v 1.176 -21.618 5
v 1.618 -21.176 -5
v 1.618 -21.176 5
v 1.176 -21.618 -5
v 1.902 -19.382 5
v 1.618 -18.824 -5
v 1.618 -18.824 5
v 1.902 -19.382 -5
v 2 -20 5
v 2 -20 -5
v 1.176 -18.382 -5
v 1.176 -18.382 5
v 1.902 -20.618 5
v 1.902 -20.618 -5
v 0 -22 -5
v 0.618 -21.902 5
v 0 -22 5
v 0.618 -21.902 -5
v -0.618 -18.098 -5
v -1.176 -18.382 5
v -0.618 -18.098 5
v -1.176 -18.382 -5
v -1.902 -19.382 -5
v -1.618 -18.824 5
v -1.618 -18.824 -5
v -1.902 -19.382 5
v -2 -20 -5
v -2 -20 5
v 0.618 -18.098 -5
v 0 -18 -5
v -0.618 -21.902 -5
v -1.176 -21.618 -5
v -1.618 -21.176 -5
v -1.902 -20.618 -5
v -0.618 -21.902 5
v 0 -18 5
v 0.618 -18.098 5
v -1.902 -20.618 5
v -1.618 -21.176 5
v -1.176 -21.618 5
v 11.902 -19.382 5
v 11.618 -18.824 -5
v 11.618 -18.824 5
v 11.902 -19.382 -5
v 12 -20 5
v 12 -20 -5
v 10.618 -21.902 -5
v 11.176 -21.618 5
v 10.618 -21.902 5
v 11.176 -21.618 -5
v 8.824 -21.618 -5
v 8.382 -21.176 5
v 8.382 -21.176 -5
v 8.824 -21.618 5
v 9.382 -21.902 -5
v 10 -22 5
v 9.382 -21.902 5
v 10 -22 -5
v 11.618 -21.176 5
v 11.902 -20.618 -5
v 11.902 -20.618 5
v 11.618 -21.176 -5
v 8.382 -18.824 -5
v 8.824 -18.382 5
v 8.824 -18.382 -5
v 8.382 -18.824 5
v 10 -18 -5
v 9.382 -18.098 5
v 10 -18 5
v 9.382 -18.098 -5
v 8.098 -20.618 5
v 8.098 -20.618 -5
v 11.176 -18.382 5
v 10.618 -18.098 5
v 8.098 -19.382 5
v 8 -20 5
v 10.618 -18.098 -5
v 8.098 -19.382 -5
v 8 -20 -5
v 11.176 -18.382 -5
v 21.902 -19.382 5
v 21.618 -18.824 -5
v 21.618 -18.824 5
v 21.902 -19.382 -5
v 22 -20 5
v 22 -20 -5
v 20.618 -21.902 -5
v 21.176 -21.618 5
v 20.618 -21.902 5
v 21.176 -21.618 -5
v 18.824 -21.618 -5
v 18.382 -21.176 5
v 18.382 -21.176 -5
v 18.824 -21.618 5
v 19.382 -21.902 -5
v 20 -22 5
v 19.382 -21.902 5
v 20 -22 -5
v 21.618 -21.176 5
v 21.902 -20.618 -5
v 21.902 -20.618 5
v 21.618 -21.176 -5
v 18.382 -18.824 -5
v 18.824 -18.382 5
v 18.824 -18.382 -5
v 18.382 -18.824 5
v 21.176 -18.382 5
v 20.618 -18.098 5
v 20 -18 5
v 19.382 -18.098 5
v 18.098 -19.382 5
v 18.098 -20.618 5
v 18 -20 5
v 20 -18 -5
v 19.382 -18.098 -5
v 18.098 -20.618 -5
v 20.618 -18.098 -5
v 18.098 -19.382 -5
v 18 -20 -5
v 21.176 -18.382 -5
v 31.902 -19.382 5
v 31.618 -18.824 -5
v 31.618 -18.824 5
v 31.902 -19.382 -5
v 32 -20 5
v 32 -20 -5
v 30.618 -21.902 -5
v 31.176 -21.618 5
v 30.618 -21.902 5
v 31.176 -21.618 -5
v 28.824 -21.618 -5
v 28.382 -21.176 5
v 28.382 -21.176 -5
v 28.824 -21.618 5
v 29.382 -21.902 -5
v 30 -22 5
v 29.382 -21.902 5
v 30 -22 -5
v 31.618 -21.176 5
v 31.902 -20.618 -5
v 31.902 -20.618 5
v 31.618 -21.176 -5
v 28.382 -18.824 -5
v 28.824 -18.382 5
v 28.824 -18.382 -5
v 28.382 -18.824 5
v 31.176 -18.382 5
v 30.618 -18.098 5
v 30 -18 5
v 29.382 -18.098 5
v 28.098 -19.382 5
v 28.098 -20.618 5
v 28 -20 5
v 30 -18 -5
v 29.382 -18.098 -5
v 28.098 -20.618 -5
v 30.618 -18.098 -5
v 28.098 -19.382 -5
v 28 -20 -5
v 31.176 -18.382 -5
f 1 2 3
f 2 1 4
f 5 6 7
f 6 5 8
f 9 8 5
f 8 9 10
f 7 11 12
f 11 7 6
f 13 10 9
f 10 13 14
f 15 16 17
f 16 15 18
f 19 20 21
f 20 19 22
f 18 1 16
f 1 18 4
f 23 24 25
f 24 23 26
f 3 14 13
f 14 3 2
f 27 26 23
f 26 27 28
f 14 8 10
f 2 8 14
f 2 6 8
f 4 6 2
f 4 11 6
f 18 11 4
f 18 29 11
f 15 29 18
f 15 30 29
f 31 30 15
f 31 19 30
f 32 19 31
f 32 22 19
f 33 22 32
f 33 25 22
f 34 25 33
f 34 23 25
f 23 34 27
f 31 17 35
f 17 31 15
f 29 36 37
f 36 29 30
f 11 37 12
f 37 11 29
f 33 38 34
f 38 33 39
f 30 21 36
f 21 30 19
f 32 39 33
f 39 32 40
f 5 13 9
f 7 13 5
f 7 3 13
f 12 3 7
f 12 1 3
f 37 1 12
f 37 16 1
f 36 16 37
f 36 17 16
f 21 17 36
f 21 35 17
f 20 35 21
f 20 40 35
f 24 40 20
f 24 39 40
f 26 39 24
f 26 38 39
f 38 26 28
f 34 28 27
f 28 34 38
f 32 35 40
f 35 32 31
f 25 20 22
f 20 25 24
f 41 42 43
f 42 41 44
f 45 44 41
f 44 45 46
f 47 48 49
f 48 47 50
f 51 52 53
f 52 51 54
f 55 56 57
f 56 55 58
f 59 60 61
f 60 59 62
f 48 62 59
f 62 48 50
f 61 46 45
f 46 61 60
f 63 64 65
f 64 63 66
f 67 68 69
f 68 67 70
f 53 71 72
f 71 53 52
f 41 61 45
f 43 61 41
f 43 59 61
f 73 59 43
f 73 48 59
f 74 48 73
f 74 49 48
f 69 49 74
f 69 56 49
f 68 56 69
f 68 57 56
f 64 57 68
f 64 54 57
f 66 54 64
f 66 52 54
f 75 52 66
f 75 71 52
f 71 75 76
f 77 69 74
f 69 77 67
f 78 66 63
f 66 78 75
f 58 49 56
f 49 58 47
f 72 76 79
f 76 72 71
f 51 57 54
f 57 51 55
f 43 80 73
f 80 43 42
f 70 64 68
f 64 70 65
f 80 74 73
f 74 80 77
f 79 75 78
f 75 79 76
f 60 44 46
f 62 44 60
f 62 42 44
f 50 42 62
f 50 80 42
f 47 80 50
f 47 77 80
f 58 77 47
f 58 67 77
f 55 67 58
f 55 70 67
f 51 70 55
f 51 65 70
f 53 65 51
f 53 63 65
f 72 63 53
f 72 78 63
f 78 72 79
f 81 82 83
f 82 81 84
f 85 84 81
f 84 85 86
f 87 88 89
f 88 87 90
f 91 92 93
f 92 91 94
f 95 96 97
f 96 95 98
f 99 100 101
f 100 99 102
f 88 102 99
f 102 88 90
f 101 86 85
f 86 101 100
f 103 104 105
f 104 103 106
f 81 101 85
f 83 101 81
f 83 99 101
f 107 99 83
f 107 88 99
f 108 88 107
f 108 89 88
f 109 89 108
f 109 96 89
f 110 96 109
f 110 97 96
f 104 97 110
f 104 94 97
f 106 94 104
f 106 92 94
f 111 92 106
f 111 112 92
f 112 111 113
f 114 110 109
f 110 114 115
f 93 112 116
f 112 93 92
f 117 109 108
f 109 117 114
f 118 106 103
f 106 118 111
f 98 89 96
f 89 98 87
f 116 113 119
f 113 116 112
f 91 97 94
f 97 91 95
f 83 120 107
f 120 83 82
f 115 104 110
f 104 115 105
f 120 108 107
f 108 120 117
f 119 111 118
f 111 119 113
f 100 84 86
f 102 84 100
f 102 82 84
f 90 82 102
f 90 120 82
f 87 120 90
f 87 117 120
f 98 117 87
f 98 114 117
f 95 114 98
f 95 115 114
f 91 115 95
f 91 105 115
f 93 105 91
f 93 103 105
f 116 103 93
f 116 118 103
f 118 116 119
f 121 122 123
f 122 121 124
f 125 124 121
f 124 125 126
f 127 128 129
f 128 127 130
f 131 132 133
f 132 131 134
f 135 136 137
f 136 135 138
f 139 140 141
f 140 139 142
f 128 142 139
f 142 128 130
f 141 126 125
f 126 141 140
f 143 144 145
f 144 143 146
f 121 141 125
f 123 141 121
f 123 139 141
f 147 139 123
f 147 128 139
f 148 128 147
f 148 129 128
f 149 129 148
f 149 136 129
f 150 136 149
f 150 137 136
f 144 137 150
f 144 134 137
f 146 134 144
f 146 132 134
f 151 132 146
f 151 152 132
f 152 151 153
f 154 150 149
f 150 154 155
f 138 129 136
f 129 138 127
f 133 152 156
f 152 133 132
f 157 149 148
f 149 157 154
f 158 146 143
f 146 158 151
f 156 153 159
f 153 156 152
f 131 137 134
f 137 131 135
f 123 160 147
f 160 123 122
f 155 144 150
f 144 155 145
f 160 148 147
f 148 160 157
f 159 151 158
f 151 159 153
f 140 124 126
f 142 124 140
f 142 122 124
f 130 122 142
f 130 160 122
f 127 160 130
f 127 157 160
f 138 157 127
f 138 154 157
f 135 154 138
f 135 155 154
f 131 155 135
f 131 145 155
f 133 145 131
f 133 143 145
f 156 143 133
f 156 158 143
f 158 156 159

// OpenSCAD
drill =4;
h1=10;
d=10;
//i=0;
n=4;

//taladro
//cylinder(r=drill/2,h=h1,$fn=20,center=true);
translate([0,-20,0])
    for(i=[0:n-1]){
    translate([i*d,0,0]) 
        cylinder(r=drill/2,h=h1,$fn=20,center=true);
    }
